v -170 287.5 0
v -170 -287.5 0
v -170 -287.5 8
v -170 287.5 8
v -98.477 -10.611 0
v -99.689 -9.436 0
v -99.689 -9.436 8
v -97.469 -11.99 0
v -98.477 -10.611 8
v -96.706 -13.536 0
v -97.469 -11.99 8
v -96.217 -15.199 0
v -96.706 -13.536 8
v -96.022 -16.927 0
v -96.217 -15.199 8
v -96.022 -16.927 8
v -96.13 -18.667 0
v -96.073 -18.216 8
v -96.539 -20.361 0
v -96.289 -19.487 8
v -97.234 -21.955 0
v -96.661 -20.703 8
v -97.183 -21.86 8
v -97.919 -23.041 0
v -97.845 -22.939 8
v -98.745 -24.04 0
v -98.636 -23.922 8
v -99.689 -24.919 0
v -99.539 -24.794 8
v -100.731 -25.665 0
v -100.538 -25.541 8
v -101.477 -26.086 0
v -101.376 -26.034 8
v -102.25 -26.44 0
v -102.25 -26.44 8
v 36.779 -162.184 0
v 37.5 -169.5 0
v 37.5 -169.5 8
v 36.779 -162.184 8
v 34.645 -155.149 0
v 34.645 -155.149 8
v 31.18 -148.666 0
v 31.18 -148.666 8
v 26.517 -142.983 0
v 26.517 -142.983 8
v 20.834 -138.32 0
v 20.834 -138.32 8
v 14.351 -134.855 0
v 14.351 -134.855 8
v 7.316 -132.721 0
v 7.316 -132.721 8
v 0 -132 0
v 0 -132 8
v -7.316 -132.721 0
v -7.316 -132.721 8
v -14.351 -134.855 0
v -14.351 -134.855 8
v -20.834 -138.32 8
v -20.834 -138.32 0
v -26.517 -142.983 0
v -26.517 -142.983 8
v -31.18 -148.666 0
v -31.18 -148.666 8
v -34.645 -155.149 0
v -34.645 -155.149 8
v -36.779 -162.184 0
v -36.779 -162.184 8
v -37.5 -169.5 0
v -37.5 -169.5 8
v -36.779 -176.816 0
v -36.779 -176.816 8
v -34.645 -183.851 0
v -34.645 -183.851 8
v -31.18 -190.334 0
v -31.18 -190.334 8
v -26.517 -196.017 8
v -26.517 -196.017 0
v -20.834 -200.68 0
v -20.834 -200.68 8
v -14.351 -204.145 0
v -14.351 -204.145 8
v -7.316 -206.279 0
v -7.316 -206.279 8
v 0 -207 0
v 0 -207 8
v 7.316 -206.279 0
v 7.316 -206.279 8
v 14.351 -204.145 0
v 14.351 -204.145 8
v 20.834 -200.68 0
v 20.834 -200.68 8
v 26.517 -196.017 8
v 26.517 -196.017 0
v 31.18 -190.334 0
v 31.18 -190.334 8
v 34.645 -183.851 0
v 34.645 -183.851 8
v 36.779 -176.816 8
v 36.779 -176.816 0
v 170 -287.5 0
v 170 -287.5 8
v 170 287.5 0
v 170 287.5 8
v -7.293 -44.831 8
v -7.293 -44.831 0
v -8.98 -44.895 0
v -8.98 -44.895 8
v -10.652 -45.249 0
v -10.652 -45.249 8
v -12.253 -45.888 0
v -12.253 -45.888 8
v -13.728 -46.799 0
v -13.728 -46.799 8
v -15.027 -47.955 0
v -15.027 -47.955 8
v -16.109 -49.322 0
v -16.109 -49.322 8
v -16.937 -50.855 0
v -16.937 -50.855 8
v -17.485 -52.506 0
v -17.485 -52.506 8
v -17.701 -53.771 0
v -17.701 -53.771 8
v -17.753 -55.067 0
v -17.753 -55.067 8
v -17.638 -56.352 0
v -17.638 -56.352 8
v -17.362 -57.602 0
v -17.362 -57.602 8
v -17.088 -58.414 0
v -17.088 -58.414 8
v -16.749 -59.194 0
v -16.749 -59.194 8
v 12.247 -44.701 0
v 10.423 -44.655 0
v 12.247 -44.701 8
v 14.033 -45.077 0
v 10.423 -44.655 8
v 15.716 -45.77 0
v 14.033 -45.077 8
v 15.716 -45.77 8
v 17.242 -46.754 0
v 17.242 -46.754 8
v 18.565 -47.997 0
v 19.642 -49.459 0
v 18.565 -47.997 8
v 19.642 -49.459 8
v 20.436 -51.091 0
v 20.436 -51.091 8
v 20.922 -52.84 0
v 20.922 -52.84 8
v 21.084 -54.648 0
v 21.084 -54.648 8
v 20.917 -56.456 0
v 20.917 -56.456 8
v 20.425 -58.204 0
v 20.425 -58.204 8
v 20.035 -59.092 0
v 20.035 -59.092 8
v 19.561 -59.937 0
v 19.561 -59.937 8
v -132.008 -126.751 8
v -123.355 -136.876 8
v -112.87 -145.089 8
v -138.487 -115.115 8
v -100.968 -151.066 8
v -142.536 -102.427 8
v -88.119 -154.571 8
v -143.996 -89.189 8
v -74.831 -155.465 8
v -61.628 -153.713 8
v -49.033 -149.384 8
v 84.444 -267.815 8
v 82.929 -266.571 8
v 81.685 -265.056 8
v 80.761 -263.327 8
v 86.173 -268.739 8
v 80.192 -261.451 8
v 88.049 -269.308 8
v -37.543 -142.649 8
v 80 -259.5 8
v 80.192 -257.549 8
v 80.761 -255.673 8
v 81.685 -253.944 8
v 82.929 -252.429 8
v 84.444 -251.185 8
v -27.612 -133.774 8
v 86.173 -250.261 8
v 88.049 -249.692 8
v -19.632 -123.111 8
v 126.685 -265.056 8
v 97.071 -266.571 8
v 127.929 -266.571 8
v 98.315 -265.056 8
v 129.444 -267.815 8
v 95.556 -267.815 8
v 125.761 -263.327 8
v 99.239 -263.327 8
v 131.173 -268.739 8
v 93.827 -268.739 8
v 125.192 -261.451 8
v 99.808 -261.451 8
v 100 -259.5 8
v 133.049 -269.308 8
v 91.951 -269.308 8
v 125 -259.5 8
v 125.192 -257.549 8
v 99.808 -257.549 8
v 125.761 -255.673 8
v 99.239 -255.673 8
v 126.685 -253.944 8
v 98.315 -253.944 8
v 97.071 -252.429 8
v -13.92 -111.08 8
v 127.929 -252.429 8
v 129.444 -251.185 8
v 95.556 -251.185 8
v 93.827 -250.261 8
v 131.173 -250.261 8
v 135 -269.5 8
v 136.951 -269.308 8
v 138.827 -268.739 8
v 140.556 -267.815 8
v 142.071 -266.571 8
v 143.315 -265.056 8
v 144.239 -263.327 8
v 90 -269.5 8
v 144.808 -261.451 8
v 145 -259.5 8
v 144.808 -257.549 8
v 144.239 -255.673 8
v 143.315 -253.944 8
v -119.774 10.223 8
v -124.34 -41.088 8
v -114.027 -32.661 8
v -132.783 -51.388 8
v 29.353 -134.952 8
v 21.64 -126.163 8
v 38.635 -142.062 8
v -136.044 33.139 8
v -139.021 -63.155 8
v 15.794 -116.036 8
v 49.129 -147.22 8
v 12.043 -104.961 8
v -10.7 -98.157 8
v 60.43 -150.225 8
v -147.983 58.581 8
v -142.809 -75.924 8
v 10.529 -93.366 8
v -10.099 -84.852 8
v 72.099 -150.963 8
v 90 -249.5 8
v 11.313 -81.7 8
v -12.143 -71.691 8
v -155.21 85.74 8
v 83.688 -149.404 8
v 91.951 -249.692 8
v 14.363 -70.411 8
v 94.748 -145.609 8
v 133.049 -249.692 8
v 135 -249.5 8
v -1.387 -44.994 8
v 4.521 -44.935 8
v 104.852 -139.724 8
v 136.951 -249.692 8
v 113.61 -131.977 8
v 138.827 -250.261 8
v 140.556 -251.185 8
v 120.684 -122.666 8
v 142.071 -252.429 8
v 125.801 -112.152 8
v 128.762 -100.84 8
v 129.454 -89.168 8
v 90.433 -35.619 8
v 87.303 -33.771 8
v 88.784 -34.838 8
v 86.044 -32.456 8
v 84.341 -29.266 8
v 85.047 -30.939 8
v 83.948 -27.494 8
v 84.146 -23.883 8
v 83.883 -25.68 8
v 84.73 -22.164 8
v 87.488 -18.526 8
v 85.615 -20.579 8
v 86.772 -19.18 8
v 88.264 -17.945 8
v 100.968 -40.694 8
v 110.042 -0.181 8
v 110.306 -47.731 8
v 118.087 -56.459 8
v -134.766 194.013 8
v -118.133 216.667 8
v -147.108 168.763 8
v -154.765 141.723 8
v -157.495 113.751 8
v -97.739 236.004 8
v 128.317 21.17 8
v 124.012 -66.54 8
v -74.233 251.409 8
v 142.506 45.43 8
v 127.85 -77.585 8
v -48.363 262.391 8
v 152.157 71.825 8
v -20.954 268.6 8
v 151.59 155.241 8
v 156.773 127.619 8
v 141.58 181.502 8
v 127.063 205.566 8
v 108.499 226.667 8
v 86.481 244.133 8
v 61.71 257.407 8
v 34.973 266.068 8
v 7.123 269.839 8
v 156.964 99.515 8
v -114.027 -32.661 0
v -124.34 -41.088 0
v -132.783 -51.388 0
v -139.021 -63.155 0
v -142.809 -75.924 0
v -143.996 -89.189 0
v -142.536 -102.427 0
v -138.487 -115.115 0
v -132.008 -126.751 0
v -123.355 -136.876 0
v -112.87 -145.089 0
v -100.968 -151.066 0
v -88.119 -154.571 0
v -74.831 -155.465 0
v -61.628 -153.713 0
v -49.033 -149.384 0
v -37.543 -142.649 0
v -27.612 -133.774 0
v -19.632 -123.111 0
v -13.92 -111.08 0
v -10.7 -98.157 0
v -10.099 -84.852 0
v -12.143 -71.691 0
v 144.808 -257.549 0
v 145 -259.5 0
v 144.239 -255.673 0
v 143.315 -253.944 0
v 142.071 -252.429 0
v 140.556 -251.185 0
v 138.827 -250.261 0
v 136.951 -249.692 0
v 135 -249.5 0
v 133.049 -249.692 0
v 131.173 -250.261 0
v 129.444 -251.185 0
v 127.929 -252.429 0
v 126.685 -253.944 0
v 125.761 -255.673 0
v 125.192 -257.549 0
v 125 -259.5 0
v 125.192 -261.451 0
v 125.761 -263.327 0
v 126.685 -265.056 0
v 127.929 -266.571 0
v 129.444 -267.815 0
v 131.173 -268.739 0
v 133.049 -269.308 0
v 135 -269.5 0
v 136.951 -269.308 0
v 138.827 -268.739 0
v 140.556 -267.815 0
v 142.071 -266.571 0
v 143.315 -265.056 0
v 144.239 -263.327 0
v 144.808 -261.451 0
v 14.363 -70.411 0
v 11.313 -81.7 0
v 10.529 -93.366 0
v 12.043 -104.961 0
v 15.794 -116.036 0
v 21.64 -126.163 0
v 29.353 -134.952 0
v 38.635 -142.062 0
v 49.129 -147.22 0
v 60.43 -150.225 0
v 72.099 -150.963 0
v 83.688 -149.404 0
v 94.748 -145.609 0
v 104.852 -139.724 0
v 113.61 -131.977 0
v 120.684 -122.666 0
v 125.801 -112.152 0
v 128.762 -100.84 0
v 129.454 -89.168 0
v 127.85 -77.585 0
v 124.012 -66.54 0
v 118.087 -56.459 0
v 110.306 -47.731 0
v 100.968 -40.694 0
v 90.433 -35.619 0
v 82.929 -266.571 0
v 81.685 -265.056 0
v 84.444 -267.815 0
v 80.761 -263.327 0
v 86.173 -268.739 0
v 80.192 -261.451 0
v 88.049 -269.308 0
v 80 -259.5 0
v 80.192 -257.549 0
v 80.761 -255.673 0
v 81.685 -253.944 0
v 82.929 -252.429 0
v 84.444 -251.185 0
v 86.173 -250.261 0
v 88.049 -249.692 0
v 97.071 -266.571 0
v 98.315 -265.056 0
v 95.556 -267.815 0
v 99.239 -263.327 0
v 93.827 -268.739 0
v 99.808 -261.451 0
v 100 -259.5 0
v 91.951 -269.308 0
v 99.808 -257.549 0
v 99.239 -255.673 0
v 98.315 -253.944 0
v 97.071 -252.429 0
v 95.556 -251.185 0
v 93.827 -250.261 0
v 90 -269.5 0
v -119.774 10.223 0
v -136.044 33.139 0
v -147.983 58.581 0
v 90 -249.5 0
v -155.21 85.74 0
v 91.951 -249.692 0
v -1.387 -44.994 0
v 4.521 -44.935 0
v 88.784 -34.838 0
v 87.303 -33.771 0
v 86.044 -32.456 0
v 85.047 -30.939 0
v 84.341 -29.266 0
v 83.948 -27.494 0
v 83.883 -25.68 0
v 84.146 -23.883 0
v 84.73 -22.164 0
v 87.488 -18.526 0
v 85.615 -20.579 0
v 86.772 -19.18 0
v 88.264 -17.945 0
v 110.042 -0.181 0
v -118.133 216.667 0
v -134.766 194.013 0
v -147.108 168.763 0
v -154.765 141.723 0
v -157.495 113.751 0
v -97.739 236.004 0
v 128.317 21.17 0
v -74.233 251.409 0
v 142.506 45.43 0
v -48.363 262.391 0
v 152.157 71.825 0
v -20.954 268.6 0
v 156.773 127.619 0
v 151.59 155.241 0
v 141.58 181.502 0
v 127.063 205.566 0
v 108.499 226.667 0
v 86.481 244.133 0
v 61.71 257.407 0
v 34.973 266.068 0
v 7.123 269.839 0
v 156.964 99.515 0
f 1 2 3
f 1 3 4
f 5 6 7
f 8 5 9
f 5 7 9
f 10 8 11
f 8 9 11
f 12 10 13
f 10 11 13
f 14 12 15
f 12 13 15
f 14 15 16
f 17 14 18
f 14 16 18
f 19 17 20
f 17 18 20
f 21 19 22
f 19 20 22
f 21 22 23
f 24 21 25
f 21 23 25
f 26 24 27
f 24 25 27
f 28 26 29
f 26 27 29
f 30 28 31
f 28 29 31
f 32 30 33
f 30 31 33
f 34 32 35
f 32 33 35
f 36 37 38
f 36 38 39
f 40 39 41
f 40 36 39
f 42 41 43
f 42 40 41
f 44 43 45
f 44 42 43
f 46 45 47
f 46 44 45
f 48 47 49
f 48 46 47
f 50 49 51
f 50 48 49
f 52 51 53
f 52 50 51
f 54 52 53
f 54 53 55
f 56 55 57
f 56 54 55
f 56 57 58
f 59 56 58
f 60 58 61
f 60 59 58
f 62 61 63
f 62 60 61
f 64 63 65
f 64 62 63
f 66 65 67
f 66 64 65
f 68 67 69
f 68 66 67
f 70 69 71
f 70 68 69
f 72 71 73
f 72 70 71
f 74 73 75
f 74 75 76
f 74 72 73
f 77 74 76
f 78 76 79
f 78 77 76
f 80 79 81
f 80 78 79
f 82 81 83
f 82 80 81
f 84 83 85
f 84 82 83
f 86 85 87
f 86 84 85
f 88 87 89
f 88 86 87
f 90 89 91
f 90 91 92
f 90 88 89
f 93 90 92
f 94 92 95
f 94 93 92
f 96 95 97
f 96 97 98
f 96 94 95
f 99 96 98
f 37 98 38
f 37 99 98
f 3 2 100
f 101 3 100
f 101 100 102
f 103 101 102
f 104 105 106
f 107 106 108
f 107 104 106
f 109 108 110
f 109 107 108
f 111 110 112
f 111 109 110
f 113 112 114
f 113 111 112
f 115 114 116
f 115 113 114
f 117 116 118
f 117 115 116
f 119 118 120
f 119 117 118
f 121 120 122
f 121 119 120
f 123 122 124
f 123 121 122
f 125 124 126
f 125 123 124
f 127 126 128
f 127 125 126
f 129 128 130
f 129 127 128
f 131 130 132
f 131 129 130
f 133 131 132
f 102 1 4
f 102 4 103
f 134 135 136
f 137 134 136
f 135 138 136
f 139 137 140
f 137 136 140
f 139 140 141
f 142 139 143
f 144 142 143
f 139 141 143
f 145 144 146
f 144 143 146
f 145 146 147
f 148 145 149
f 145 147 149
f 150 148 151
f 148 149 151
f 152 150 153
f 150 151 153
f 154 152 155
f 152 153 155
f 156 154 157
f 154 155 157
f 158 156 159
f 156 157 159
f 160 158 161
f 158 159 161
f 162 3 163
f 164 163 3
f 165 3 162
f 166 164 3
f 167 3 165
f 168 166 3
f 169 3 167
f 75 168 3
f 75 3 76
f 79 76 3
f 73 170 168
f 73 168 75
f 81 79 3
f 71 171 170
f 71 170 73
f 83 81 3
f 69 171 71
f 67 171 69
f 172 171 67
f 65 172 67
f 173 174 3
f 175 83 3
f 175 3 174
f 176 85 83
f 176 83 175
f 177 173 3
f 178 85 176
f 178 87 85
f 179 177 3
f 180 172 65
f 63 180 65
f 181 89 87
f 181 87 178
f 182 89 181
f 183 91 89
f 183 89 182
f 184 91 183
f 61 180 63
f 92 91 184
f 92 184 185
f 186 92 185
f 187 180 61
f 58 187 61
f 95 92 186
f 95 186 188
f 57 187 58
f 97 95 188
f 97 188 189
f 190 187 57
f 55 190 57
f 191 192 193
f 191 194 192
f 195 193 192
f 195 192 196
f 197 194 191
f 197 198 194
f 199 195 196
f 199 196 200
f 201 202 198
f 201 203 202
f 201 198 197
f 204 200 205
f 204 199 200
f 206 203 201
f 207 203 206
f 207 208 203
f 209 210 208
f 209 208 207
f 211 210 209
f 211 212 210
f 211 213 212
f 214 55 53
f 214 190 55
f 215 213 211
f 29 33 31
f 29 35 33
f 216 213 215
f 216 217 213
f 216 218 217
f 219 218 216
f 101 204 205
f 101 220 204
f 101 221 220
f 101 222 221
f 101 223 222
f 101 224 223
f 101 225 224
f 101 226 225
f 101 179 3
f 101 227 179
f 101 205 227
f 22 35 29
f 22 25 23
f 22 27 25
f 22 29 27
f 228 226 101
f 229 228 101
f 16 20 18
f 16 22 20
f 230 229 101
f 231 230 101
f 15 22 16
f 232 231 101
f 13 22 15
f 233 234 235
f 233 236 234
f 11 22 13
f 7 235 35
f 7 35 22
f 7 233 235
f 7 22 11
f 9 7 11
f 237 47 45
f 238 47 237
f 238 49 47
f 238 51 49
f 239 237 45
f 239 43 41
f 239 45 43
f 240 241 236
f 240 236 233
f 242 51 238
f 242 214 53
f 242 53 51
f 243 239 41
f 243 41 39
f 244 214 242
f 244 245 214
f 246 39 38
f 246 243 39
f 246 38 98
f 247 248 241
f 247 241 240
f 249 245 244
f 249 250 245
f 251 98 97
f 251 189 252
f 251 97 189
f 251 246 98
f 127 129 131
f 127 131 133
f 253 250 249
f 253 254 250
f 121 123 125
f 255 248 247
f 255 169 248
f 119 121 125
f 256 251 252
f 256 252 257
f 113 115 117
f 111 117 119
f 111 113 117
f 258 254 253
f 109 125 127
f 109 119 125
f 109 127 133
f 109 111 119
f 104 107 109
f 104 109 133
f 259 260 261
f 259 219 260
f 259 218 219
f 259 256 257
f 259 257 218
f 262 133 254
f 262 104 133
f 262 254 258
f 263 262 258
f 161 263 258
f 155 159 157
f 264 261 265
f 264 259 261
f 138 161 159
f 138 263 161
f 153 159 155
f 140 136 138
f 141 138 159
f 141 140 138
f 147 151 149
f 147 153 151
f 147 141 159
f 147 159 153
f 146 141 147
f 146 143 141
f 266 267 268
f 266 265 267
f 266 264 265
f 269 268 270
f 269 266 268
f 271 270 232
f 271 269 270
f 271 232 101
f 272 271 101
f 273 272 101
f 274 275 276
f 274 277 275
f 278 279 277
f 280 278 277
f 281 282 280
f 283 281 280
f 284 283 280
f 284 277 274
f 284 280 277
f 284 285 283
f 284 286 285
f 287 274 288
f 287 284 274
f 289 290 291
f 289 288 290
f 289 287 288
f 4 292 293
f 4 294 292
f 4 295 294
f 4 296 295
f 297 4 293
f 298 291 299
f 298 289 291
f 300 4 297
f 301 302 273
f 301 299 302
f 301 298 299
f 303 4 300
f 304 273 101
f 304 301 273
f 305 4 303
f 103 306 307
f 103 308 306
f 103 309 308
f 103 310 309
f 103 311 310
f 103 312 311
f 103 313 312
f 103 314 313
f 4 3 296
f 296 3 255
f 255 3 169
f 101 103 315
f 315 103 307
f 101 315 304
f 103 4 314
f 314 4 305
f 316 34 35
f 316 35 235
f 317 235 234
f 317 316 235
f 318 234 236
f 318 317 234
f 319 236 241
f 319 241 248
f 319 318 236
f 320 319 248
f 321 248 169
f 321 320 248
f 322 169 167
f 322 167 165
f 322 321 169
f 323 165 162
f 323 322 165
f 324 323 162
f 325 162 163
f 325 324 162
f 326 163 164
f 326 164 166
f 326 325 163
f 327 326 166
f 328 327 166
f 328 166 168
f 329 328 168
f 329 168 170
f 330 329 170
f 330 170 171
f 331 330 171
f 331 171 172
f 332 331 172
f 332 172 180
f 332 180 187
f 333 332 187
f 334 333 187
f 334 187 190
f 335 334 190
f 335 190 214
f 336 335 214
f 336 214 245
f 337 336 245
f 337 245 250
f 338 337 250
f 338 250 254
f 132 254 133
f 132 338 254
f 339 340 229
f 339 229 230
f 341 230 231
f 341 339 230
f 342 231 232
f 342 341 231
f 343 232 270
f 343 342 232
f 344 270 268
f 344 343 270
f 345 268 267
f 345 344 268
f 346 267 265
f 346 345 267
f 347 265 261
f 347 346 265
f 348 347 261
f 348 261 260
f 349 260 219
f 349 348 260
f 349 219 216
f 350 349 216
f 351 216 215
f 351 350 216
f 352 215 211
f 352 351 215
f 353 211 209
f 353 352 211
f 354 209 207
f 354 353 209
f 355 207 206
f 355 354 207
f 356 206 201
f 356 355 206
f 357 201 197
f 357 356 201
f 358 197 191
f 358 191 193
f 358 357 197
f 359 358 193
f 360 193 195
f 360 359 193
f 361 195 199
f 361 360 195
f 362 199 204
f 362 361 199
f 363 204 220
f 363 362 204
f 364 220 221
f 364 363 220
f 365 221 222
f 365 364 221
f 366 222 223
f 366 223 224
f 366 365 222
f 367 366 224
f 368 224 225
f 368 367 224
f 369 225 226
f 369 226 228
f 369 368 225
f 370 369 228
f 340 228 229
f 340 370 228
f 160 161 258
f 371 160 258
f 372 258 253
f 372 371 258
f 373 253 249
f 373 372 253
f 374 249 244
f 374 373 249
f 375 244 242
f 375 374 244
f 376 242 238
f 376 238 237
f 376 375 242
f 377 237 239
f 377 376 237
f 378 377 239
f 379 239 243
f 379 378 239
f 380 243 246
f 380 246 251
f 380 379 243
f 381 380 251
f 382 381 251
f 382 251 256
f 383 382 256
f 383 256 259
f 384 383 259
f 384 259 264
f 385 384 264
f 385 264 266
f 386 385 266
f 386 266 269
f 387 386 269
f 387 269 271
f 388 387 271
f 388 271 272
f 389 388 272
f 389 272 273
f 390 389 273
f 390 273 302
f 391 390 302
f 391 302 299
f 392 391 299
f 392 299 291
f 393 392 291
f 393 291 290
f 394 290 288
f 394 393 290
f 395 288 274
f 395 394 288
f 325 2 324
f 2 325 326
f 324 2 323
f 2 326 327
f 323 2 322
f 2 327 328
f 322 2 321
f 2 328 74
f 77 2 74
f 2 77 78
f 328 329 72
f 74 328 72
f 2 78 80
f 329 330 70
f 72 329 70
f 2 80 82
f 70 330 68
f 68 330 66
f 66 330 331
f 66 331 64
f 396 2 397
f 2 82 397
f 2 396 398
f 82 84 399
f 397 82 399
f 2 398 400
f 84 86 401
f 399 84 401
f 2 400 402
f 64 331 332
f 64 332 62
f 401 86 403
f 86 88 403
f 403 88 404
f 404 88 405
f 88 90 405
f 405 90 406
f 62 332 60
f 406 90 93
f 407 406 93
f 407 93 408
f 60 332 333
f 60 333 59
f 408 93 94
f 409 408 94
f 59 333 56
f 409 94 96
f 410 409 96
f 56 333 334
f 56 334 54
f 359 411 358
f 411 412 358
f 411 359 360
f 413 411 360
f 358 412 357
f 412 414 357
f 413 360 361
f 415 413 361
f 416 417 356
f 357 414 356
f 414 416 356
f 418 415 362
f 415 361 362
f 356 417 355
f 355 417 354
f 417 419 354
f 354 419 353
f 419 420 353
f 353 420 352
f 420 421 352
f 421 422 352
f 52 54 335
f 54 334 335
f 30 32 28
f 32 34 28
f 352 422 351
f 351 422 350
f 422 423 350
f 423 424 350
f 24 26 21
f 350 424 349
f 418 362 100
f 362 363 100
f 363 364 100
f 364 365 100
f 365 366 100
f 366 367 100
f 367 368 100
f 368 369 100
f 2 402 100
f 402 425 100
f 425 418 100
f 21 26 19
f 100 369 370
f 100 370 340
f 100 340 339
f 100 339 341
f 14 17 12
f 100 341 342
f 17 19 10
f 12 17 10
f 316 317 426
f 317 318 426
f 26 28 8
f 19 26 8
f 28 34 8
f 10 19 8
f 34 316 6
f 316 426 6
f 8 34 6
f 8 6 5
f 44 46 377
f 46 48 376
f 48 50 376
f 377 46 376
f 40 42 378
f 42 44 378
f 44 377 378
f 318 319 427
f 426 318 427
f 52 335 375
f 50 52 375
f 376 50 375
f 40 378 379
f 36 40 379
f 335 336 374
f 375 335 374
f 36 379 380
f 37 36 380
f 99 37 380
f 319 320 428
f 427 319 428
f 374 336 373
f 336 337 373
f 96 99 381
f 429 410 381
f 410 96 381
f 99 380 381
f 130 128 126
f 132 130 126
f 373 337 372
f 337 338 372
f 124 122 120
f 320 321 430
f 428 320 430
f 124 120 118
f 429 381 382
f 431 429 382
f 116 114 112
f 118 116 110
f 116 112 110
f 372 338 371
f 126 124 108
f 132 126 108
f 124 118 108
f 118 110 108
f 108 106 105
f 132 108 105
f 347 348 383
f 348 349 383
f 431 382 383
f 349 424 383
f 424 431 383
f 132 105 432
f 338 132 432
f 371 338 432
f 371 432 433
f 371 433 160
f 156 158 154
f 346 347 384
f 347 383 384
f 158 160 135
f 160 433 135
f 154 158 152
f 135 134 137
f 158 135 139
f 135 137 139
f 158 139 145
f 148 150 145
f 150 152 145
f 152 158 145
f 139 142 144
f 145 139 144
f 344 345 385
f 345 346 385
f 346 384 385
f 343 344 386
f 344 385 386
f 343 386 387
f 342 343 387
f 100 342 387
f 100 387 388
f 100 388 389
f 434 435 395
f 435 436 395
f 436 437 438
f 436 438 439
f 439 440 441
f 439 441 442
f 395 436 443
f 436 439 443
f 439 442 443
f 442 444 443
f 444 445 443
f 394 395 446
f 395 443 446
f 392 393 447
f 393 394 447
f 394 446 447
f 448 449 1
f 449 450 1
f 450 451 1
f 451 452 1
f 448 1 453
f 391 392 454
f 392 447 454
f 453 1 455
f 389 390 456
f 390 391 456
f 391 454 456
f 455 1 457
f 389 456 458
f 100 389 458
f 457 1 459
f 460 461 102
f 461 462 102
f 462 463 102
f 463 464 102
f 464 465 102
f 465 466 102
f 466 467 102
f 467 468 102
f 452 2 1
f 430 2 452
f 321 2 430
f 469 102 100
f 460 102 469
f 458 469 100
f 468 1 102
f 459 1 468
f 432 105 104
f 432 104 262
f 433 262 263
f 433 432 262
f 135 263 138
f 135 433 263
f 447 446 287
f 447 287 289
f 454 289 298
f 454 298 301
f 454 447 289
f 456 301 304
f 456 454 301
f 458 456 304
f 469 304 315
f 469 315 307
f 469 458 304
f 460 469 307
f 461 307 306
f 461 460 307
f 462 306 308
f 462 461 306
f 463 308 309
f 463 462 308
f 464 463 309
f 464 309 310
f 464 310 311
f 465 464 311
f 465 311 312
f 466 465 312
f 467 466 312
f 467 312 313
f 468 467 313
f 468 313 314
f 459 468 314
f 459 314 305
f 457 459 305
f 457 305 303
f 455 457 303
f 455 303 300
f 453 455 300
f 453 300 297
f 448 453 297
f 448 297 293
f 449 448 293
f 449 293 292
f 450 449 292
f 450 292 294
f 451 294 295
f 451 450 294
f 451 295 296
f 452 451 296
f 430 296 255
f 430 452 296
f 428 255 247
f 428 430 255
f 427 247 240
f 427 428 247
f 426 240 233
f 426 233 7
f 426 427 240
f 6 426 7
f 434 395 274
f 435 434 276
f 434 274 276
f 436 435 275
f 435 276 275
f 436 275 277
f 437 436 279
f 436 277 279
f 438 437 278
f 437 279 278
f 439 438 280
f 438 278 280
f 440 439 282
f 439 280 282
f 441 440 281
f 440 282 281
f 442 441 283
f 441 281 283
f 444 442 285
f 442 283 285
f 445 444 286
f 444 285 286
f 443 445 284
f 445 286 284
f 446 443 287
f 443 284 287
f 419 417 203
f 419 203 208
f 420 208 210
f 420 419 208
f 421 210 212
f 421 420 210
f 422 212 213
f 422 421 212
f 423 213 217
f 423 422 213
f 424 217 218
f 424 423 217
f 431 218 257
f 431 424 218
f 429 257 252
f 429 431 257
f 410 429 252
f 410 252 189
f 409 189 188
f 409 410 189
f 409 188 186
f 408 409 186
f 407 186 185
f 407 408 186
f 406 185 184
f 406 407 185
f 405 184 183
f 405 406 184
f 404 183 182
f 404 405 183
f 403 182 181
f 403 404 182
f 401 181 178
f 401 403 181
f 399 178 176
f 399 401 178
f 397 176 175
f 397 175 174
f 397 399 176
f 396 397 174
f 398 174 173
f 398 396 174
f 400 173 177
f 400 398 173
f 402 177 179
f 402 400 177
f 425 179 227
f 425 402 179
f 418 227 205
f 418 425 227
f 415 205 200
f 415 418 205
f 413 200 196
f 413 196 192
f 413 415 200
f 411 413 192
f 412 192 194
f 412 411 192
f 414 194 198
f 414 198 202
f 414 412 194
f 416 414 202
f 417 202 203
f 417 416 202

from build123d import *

# Parameters (mm, degrees)
SKETCH001_W   = 340
SKETCH001_H   = 575
SKETCH001_R   = 10
SKETCH001_R_2 = 37.5
PAD_DEPTH     = 8
FILLET_R      = 10


with BuildPart() as part:
    # Sketch001 → Pad (new body)
    with BuildSketch(Plane.XY):
        Rectangle(SKETCH001_W, SKETCH001_H)
        with Locations((90, -259.5)):
            Circle(SKETCH001_R, mode=Mode.SUBTRACT)
        with Locations((135, -259.5)):
            Circle(SKETCH001_R, mode=Mode.SUBTRACT)
        with Locations((0, -169.5)):
            Circle(SKETCH001_R_2, mode=Mode.SUBTRACT)
        with BuildLine():
            ThreePointArc((-28.356199, -42.426357), (6.438053, -44.868362), (40.916555, -39.592358))
            ThreePointArc((40.916555, -39.592358), (89.311403, -147.778946), (61.085766, -32.671551))
            ThreePointArc((61.085766, -32.671551), (11.986677, 269.543209), (-82.410869, -21.718846))
            ThreePointArc((-82.410869, -21.718846), (-100.968142, -151.06619), (-28.356199, -42.426357))
        make_face(mode=Mode.SUBTRACT)
    extrude(amount=PAD_DEPTH)

    # Fillet
    fillet_edges = [part.edges().sort_by_distance(p)[0] for p in [
        (-82.410869, -21.718846, 4),
        (40.916555, -39.592358, 4),
        (61.085766, -32.671551, 4),
        (-28.356199, -42.426357, 4),
    ]]
    fillet(fillet_edges, radius=FILLET_R)


solid = part.part
